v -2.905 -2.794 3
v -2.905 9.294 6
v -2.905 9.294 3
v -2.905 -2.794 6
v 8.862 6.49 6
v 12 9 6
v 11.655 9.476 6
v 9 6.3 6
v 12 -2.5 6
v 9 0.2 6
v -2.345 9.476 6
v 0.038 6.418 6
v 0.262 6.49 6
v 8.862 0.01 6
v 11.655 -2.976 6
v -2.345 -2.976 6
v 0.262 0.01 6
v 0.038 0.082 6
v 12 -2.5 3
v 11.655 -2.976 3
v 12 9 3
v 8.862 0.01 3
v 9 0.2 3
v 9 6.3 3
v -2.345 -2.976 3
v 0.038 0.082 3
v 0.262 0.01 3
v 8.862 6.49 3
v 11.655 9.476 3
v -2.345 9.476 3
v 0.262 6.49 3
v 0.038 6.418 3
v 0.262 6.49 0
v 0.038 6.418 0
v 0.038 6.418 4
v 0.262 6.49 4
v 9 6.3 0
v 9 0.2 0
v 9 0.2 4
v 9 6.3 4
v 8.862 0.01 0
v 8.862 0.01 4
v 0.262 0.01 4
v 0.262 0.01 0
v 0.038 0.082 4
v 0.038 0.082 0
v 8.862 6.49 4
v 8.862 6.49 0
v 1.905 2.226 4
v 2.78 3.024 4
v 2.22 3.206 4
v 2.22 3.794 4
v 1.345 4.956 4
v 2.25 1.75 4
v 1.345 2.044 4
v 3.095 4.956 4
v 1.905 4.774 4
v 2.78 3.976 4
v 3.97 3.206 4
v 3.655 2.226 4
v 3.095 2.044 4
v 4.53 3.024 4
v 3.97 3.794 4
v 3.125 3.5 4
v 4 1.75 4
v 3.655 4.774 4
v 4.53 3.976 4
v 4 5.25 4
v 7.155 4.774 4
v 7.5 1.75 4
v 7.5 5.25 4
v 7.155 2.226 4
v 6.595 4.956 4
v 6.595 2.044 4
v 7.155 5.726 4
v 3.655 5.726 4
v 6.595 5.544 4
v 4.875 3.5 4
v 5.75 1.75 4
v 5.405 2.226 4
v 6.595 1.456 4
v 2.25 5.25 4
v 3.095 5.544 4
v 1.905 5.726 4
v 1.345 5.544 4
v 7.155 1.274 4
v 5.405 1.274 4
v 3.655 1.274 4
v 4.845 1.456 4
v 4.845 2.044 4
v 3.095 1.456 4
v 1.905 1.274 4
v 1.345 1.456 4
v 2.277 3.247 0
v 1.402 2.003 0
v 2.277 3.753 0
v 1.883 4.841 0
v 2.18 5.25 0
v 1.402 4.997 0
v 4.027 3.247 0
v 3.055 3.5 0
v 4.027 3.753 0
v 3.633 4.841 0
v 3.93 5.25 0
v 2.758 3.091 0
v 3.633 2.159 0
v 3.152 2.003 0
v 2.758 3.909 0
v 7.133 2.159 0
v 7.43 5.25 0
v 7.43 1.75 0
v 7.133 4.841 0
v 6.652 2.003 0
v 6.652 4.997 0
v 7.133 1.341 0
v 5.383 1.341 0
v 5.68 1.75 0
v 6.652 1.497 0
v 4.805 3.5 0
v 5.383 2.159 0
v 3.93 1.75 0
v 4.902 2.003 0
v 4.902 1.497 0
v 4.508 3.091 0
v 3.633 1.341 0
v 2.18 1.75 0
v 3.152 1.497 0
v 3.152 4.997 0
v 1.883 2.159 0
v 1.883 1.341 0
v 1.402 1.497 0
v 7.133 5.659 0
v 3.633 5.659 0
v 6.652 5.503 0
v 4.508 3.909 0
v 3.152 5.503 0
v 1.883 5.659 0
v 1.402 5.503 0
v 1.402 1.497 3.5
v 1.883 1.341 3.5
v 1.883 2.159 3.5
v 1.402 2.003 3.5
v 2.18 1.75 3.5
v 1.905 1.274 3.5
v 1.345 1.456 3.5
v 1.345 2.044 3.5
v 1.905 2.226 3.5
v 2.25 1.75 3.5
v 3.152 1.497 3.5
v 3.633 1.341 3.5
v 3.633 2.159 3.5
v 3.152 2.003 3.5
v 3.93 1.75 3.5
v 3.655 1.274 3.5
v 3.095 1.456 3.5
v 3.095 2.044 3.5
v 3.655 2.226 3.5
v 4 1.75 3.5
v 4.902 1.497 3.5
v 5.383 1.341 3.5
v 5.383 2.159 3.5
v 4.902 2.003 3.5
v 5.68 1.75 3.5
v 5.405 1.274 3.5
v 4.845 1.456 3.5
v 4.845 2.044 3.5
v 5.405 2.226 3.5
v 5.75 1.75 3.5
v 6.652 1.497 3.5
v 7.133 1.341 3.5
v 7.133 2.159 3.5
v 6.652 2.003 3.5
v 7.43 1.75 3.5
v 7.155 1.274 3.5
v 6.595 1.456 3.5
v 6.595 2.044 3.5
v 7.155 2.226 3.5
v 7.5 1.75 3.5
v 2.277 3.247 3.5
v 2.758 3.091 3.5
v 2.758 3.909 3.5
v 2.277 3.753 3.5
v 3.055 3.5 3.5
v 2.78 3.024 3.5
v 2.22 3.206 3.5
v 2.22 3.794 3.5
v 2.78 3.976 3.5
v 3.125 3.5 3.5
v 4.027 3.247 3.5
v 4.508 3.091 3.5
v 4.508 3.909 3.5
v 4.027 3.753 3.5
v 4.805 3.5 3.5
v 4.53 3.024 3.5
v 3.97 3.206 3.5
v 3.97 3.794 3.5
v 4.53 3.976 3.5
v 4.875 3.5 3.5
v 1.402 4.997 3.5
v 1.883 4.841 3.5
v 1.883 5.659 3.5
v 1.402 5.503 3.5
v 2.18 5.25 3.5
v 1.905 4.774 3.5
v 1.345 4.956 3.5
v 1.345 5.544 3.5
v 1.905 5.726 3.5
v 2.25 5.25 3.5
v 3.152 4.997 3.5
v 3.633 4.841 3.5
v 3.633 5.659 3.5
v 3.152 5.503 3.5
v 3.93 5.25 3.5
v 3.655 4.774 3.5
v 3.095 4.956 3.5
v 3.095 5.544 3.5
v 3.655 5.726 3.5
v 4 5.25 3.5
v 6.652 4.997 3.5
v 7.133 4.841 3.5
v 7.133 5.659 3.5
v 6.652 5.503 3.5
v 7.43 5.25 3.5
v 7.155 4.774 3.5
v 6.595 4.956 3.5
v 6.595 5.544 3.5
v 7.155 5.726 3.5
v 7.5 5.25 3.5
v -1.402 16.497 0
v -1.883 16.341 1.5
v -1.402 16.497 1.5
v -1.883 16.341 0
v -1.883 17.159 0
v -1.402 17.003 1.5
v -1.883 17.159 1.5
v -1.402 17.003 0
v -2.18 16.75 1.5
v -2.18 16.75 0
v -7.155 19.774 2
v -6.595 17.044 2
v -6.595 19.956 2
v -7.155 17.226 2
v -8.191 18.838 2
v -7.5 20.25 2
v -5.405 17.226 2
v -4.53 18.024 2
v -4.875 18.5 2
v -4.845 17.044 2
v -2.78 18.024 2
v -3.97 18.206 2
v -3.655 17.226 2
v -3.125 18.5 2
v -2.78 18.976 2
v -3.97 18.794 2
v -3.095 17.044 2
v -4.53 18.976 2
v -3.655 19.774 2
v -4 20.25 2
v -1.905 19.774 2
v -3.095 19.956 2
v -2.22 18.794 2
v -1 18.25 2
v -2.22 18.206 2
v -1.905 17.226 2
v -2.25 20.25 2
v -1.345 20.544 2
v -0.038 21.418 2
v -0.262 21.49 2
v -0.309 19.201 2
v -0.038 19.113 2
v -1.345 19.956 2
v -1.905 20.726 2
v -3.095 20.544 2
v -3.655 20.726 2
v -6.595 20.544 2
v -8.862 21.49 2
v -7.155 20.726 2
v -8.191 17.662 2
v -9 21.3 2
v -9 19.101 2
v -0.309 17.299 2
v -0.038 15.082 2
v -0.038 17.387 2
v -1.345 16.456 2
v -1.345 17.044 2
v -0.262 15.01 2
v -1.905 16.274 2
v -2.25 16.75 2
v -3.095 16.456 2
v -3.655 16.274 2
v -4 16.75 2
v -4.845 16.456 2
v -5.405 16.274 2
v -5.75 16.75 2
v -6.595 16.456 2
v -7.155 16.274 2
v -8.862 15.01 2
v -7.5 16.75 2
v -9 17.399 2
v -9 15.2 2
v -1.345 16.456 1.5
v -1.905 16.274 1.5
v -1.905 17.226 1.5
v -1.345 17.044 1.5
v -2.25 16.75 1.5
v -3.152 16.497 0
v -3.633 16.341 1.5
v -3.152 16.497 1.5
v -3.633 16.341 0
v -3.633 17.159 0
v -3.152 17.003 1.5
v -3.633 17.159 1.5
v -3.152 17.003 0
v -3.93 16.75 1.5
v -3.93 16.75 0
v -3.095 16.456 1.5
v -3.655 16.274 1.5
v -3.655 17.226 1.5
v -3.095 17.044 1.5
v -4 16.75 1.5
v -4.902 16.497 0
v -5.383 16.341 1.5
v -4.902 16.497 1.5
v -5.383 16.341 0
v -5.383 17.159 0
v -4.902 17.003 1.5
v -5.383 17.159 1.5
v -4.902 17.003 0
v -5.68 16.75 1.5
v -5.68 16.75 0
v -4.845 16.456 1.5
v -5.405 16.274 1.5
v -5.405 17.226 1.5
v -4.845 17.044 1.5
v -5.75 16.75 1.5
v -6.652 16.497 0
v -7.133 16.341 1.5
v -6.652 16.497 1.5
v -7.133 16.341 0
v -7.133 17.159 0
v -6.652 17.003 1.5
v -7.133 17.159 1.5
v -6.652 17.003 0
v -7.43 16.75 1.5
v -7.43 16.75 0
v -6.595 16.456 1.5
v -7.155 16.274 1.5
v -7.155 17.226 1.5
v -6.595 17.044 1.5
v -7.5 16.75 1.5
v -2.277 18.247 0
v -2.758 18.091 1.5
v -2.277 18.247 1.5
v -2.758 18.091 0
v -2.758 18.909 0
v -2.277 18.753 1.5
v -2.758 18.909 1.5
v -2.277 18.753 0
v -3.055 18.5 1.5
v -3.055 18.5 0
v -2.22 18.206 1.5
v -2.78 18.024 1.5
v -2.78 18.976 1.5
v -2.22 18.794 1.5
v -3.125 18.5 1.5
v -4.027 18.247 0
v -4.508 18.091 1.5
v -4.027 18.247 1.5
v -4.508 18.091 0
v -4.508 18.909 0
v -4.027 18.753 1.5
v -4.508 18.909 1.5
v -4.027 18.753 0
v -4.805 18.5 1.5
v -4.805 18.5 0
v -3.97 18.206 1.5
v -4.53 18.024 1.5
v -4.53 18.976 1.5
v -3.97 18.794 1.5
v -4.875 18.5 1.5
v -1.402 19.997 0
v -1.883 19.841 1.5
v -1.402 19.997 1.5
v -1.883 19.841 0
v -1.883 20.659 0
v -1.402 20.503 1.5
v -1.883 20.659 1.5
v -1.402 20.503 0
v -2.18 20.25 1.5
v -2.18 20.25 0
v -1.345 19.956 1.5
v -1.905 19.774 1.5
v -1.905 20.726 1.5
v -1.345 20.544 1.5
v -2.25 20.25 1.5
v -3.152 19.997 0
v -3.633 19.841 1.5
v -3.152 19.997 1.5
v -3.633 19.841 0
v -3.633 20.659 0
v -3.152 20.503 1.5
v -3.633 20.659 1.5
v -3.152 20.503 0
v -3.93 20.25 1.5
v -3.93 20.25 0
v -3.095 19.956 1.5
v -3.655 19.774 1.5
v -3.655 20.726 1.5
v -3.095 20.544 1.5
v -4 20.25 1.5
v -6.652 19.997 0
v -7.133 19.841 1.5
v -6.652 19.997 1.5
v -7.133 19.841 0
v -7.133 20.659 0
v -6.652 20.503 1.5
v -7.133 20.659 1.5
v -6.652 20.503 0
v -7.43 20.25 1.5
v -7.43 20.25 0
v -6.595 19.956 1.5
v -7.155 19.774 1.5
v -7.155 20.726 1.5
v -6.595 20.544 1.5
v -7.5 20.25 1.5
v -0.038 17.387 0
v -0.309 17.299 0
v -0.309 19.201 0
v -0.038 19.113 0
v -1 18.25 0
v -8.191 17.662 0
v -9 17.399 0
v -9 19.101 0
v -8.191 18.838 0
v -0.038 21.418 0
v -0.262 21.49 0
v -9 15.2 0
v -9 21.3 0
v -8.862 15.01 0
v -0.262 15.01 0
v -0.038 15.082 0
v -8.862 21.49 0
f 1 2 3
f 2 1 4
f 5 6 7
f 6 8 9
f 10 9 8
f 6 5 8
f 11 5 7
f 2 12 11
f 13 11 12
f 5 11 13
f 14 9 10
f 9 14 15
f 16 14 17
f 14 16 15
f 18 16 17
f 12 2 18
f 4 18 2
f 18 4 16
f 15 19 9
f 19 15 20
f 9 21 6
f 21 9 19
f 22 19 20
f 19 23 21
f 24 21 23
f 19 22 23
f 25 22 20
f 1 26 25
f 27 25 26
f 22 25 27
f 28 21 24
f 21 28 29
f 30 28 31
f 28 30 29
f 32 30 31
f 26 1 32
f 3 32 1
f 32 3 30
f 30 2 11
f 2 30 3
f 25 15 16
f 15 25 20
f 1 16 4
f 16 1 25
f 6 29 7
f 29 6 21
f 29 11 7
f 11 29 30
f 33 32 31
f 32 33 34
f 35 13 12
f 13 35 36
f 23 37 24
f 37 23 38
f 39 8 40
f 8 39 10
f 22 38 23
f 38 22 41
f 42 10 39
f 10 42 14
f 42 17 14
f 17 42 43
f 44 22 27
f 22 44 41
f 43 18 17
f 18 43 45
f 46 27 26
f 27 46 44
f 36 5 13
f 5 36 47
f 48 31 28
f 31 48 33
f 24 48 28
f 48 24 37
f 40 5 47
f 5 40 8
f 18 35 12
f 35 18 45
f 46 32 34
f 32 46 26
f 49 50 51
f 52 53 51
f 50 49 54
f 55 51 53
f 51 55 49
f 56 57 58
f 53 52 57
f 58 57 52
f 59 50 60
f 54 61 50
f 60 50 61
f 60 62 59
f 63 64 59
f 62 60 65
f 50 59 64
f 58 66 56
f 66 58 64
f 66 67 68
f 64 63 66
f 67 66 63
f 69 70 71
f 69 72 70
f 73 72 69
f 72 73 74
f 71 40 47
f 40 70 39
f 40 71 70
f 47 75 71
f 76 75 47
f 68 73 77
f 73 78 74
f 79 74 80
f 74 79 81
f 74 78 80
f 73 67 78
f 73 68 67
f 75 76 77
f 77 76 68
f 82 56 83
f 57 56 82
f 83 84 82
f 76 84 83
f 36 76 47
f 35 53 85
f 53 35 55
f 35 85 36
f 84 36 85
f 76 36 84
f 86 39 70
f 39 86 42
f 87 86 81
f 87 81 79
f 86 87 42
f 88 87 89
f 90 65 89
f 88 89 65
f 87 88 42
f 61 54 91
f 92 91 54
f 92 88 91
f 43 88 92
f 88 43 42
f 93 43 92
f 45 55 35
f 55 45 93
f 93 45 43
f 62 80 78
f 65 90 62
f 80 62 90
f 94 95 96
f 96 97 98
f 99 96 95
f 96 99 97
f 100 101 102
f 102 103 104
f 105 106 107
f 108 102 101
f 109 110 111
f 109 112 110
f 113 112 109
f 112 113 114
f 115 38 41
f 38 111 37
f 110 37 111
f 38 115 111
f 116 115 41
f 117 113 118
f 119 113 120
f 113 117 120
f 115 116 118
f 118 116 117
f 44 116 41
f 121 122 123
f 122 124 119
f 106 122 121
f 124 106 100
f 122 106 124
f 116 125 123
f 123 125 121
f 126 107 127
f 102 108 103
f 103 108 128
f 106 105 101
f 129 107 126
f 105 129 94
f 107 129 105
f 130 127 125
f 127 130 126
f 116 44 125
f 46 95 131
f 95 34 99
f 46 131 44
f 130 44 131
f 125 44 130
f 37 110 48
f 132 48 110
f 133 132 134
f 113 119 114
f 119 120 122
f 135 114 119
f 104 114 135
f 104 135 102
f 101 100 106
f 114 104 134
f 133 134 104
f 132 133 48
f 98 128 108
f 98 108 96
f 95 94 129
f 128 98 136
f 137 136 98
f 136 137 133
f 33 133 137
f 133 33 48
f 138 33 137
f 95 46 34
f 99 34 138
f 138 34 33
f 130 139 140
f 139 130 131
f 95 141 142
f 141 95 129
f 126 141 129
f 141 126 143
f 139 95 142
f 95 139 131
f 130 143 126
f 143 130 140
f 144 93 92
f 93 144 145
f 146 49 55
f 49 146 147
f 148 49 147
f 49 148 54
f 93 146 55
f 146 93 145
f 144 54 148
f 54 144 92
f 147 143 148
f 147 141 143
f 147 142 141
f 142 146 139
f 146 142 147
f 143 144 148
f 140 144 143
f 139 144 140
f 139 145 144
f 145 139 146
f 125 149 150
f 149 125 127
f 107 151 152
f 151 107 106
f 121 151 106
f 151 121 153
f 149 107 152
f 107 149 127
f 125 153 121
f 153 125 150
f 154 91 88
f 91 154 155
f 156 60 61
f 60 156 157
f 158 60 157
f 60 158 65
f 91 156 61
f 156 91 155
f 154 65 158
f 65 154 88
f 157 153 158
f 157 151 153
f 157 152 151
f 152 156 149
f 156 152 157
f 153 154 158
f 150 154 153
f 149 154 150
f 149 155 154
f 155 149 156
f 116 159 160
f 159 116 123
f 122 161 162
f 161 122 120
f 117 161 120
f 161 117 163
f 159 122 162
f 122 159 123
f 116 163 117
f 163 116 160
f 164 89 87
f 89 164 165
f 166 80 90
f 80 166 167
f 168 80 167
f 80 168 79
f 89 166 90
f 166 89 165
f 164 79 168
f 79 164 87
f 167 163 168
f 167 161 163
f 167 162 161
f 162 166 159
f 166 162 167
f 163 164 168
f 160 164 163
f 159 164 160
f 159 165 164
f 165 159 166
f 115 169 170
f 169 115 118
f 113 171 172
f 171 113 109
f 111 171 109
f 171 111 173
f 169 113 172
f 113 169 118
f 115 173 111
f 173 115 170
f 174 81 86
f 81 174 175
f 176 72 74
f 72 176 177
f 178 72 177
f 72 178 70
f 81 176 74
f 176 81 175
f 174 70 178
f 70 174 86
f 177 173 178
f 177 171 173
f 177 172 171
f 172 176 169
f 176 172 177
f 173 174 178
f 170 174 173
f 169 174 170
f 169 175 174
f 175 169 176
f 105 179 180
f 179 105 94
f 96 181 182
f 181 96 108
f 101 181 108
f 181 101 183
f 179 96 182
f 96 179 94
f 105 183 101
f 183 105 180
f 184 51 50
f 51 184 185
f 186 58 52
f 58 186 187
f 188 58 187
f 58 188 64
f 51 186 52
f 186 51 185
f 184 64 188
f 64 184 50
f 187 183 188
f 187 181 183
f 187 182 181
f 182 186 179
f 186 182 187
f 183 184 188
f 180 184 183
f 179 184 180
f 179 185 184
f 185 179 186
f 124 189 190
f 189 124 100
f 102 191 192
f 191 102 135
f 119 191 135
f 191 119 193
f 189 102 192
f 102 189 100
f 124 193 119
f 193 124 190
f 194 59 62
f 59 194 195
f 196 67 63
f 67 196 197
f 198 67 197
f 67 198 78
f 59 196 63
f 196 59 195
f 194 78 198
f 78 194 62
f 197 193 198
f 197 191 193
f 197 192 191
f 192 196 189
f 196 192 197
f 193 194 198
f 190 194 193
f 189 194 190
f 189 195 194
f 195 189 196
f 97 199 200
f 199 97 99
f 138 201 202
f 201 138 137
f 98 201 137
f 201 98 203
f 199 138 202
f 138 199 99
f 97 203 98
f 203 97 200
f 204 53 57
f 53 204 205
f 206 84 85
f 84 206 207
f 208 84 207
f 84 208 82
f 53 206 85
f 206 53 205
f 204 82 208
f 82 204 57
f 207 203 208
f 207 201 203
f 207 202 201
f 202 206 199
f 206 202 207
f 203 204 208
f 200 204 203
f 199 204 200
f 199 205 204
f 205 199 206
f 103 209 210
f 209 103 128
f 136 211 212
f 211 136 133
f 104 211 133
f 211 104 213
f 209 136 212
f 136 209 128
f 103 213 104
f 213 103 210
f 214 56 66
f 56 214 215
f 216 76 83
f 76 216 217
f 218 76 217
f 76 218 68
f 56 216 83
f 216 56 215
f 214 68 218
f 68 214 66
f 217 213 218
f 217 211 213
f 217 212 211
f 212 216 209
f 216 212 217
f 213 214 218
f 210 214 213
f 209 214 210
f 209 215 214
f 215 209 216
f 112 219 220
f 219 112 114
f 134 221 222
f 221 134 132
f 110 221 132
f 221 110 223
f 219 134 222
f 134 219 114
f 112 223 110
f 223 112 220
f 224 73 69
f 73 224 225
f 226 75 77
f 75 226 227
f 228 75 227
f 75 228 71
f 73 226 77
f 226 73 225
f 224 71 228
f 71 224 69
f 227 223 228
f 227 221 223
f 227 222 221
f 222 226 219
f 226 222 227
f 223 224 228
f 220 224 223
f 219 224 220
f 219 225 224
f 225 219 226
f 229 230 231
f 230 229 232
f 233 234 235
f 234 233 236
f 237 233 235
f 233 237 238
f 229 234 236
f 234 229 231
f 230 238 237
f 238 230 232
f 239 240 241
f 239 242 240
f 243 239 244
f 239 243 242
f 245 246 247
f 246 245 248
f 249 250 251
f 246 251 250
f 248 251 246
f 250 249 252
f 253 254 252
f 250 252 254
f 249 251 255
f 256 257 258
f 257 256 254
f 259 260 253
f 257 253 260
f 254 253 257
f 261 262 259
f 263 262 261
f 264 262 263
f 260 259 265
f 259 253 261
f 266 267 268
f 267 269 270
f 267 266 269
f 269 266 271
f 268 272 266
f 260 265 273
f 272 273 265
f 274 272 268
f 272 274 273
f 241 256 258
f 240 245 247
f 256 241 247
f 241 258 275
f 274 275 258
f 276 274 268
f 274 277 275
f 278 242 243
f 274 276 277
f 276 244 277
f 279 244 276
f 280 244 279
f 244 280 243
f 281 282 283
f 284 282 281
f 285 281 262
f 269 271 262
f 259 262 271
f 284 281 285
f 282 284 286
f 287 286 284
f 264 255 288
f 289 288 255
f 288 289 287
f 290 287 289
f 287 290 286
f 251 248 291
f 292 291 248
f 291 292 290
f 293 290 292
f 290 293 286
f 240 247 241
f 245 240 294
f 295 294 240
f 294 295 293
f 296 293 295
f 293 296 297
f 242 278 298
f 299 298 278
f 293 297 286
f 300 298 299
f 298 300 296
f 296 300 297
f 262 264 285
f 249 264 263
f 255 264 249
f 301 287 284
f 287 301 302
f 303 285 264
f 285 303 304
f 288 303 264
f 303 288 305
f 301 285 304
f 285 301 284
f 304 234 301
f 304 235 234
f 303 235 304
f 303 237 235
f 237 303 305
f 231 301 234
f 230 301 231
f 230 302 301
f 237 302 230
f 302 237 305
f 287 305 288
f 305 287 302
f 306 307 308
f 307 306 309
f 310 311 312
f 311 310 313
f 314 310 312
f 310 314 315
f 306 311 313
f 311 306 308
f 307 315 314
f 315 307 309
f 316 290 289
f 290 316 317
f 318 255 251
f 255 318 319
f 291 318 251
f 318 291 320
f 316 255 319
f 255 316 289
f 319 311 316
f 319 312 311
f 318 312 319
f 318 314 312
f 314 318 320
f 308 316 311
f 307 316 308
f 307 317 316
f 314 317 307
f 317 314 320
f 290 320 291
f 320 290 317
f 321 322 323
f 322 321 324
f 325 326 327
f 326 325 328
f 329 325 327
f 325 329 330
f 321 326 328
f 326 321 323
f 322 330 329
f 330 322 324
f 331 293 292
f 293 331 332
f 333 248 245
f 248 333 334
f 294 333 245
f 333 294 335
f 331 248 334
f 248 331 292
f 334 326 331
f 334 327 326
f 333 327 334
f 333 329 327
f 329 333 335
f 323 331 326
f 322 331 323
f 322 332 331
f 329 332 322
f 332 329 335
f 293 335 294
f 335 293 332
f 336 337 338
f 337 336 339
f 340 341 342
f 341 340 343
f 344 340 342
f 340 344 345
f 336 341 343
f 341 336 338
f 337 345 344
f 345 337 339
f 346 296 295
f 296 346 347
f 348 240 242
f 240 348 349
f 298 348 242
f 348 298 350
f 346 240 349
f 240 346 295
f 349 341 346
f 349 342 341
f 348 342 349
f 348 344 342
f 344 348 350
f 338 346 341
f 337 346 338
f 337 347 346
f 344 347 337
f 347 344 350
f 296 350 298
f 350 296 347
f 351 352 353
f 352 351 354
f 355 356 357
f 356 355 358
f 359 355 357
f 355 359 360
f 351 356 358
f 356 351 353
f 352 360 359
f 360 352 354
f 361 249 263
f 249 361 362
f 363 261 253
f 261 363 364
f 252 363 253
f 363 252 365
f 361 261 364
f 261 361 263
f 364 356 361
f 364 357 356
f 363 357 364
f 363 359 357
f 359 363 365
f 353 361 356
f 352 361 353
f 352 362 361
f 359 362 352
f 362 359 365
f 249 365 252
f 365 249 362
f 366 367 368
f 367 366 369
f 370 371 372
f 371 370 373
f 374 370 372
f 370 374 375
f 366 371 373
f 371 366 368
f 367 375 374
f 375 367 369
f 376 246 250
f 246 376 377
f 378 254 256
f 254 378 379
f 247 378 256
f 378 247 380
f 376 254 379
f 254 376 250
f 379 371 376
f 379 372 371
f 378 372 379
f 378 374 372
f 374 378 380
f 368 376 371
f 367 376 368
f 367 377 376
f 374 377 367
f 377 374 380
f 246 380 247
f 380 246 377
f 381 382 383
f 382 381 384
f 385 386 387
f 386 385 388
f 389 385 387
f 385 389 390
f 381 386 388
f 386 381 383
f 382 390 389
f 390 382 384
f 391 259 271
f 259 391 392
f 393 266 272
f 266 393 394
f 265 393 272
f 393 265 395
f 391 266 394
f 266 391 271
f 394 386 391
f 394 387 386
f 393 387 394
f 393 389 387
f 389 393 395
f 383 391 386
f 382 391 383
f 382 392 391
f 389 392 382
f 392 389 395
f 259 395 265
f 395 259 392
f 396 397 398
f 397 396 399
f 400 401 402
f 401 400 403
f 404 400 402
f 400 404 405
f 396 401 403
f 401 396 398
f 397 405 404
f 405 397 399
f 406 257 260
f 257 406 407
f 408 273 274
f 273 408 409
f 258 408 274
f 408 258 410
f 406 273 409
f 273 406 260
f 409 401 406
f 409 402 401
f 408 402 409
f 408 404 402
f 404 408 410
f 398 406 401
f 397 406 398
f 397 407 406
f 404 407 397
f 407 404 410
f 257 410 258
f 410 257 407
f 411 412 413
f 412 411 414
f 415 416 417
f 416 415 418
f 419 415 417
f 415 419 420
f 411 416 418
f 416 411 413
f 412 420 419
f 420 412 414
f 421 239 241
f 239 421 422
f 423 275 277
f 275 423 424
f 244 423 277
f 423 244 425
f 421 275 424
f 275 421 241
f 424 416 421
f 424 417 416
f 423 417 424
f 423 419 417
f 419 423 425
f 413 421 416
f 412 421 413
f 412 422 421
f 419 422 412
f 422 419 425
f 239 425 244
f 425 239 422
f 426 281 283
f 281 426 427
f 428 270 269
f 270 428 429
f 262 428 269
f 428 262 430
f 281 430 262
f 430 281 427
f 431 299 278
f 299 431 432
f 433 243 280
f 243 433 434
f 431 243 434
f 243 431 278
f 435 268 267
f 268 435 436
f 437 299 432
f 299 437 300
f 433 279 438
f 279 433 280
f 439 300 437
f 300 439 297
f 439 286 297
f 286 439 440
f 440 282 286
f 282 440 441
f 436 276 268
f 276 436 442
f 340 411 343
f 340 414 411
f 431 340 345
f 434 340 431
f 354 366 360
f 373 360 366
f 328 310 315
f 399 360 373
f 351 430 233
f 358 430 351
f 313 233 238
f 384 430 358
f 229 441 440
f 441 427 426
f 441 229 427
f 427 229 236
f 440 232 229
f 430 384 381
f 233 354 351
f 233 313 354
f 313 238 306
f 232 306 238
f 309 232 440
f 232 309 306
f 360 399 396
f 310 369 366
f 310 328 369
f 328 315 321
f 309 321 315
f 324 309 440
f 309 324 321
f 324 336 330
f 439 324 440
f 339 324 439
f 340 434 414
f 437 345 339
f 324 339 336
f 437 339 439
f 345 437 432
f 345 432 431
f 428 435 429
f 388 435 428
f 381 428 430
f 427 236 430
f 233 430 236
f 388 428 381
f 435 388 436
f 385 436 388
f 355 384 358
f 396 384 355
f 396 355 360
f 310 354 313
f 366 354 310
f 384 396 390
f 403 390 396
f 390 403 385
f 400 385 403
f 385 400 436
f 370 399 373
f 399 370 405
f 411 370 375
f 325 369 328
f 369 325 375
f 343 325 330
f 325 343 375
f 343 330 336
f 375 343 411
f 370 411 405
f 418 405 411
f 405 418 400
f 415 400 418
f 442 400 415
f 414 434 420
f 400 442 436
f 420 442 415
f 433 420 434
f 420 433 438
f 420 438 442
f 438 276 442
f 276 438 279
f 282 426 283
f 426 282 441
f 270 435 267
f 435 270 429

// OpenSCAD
//!OpenSCAD

module makePinTopper(pinD, pinHeadD) {
  union(){
    cylinder(r1=(pinD / 2), r2=(pinD / 2), h=4, center=false);
    translate([0, 0, 0]){
      cylinder(r1=(pinHeadD / 2), r2=(pinHeadD / 2), h=0.5, center=false);
    }
  }
}

module makePin(pinD, pinHeadD) {
  union(){
    cylinder(r1=(pinD / 2), r2=(pinD / 2), h=4, center=false);
    translate([0, 0, 3.5]){
      cylinder(r1=(pinHeadD / 2), r2=(pinHeadD / 2), h=0.5, center=false);
    }
  }
}

module makeCentredPinTopper(padW, padH, pinDia, pinHeadDia) {
  union(){
    translate([(padW / 2), (padH / 2), 0]){
      makePinTopper(pinDia, pinHeadDia);
    }
  }
}

module makePadWithPin(padW, padH, pinDia, pinHeadDia) {
  union(){
    translate([(padW / 2), (padH / 2), 0]){
      makePin(pinDia, pinHeadDia);
    }
  }
}

module makeProbeBlock(L, W, Radius, H) {
  color([1,0.8,0]) {
    hull(){
      translate([Radius, Radius, 0]){
        cylinder(r1=Radius, r2=Radius, h=H, center=false);
      }
      translate([(W - Radius), Radius, 0]){
        cylinder(r1=Radius, r2=Radius, h=H, center=false);
      }
      translate([(W - Radius), (L - Radius), 0]){
        cylinder(r1=Radius, r2=Radius, h=H, center=false);
      }
      translate([Radius, (L - Radius), 0]){
        cylinder(r1=Radius, r2=Radius, h=H, center=false);
      }
    }
  }
}

pinDiameter = 0.86;
pinHeadDiameter = 1;
padWidth = 1.5;
padHeight = 1.5;
pinSpacing = 1.75;
topBorder = 1;
leftBorder = 1;

difference() {
  union(){
    makeProbeBlock(6.5, 9, 0.2, 4);
    difference() {
      translate([-3, -3, 3]){
        makeProbeBlock(12.5, 15, 0.5, 3);
      }

      translate([0, 0, 3]){
        makeProbeBlock(6.5, 9, 0.2, 4);
      }
    }
  }

  for (row = [1 : abs(1) : 3]) {
    if (row % 2 == 1) {
      translate([leftBorder, 0, 0]){
        for (pin = [0 : abs(1) : 3]) {
          if (!(row == 3 && pin == 2)) {
            translate([(pin * pinSpacing), (topBorder + (row - 1) * pinSpacing), 0]){
              makePadWithPin(padWidth, padHeight, pinDiameter, pinHeadDiameter);
            }
          }

        }

      }
    } else {
      for (pin = [0 : abs(1) : 1]) {
        translate([((leftBorder + pinSpacing / 2) + pin * pinSpacing), (topBorder + pinSpacing), 0]){
          makePadWithPin(padWidth, padHeight, pinDiameter, pinHeadDiameter);
        }
      }

    }

  }

}
translate([0, 0, 2]){
  rotate([0, 180, 0]){
    translate([0, 15, 0]){
      difference() {
        makeProbeBlock(6.5, 9, 0.2, 2);

        union(){
          translate([0, (6.5 / 2), 0]){
            cylinder(r1=1, r2=1, h=10, center=false);
          }
          translate([9, (6.5 / 2), 0]){
            cylinder(r1=1, r2=1, h=10, center=false);
          }
          for (row = [1 : abs(1) : 3]) {
            if (row % 2 == 1) {
              translate([leftBorder, 0, 0]){
                for (pin = [0 : abs(1) : 3]) {
                  if (!(row == 3 && pin == 2)) {
                    translate([(pin * pinSpacing), (topBorder + (row - 1) * pinSpacing), 0]){
                      makeCentredPinTopper(padWidth, padHeight, pinDiameter, pinHeadDiameter);
                    }
                  }

                }

              }
            } else {
              for (pin = [0 : abs(1) : 1]) {
                translate([((leftBorder + pinSpacing / 2) + pin * pinSpacing), (topBorder + pinSpacing), 0]){
                  makeCentredPinTopper(padWidth, padHeight, pinDiameter, pinHeadDiameter);
                }
              }

            }

          }

        }
      }
    }
  }
}
